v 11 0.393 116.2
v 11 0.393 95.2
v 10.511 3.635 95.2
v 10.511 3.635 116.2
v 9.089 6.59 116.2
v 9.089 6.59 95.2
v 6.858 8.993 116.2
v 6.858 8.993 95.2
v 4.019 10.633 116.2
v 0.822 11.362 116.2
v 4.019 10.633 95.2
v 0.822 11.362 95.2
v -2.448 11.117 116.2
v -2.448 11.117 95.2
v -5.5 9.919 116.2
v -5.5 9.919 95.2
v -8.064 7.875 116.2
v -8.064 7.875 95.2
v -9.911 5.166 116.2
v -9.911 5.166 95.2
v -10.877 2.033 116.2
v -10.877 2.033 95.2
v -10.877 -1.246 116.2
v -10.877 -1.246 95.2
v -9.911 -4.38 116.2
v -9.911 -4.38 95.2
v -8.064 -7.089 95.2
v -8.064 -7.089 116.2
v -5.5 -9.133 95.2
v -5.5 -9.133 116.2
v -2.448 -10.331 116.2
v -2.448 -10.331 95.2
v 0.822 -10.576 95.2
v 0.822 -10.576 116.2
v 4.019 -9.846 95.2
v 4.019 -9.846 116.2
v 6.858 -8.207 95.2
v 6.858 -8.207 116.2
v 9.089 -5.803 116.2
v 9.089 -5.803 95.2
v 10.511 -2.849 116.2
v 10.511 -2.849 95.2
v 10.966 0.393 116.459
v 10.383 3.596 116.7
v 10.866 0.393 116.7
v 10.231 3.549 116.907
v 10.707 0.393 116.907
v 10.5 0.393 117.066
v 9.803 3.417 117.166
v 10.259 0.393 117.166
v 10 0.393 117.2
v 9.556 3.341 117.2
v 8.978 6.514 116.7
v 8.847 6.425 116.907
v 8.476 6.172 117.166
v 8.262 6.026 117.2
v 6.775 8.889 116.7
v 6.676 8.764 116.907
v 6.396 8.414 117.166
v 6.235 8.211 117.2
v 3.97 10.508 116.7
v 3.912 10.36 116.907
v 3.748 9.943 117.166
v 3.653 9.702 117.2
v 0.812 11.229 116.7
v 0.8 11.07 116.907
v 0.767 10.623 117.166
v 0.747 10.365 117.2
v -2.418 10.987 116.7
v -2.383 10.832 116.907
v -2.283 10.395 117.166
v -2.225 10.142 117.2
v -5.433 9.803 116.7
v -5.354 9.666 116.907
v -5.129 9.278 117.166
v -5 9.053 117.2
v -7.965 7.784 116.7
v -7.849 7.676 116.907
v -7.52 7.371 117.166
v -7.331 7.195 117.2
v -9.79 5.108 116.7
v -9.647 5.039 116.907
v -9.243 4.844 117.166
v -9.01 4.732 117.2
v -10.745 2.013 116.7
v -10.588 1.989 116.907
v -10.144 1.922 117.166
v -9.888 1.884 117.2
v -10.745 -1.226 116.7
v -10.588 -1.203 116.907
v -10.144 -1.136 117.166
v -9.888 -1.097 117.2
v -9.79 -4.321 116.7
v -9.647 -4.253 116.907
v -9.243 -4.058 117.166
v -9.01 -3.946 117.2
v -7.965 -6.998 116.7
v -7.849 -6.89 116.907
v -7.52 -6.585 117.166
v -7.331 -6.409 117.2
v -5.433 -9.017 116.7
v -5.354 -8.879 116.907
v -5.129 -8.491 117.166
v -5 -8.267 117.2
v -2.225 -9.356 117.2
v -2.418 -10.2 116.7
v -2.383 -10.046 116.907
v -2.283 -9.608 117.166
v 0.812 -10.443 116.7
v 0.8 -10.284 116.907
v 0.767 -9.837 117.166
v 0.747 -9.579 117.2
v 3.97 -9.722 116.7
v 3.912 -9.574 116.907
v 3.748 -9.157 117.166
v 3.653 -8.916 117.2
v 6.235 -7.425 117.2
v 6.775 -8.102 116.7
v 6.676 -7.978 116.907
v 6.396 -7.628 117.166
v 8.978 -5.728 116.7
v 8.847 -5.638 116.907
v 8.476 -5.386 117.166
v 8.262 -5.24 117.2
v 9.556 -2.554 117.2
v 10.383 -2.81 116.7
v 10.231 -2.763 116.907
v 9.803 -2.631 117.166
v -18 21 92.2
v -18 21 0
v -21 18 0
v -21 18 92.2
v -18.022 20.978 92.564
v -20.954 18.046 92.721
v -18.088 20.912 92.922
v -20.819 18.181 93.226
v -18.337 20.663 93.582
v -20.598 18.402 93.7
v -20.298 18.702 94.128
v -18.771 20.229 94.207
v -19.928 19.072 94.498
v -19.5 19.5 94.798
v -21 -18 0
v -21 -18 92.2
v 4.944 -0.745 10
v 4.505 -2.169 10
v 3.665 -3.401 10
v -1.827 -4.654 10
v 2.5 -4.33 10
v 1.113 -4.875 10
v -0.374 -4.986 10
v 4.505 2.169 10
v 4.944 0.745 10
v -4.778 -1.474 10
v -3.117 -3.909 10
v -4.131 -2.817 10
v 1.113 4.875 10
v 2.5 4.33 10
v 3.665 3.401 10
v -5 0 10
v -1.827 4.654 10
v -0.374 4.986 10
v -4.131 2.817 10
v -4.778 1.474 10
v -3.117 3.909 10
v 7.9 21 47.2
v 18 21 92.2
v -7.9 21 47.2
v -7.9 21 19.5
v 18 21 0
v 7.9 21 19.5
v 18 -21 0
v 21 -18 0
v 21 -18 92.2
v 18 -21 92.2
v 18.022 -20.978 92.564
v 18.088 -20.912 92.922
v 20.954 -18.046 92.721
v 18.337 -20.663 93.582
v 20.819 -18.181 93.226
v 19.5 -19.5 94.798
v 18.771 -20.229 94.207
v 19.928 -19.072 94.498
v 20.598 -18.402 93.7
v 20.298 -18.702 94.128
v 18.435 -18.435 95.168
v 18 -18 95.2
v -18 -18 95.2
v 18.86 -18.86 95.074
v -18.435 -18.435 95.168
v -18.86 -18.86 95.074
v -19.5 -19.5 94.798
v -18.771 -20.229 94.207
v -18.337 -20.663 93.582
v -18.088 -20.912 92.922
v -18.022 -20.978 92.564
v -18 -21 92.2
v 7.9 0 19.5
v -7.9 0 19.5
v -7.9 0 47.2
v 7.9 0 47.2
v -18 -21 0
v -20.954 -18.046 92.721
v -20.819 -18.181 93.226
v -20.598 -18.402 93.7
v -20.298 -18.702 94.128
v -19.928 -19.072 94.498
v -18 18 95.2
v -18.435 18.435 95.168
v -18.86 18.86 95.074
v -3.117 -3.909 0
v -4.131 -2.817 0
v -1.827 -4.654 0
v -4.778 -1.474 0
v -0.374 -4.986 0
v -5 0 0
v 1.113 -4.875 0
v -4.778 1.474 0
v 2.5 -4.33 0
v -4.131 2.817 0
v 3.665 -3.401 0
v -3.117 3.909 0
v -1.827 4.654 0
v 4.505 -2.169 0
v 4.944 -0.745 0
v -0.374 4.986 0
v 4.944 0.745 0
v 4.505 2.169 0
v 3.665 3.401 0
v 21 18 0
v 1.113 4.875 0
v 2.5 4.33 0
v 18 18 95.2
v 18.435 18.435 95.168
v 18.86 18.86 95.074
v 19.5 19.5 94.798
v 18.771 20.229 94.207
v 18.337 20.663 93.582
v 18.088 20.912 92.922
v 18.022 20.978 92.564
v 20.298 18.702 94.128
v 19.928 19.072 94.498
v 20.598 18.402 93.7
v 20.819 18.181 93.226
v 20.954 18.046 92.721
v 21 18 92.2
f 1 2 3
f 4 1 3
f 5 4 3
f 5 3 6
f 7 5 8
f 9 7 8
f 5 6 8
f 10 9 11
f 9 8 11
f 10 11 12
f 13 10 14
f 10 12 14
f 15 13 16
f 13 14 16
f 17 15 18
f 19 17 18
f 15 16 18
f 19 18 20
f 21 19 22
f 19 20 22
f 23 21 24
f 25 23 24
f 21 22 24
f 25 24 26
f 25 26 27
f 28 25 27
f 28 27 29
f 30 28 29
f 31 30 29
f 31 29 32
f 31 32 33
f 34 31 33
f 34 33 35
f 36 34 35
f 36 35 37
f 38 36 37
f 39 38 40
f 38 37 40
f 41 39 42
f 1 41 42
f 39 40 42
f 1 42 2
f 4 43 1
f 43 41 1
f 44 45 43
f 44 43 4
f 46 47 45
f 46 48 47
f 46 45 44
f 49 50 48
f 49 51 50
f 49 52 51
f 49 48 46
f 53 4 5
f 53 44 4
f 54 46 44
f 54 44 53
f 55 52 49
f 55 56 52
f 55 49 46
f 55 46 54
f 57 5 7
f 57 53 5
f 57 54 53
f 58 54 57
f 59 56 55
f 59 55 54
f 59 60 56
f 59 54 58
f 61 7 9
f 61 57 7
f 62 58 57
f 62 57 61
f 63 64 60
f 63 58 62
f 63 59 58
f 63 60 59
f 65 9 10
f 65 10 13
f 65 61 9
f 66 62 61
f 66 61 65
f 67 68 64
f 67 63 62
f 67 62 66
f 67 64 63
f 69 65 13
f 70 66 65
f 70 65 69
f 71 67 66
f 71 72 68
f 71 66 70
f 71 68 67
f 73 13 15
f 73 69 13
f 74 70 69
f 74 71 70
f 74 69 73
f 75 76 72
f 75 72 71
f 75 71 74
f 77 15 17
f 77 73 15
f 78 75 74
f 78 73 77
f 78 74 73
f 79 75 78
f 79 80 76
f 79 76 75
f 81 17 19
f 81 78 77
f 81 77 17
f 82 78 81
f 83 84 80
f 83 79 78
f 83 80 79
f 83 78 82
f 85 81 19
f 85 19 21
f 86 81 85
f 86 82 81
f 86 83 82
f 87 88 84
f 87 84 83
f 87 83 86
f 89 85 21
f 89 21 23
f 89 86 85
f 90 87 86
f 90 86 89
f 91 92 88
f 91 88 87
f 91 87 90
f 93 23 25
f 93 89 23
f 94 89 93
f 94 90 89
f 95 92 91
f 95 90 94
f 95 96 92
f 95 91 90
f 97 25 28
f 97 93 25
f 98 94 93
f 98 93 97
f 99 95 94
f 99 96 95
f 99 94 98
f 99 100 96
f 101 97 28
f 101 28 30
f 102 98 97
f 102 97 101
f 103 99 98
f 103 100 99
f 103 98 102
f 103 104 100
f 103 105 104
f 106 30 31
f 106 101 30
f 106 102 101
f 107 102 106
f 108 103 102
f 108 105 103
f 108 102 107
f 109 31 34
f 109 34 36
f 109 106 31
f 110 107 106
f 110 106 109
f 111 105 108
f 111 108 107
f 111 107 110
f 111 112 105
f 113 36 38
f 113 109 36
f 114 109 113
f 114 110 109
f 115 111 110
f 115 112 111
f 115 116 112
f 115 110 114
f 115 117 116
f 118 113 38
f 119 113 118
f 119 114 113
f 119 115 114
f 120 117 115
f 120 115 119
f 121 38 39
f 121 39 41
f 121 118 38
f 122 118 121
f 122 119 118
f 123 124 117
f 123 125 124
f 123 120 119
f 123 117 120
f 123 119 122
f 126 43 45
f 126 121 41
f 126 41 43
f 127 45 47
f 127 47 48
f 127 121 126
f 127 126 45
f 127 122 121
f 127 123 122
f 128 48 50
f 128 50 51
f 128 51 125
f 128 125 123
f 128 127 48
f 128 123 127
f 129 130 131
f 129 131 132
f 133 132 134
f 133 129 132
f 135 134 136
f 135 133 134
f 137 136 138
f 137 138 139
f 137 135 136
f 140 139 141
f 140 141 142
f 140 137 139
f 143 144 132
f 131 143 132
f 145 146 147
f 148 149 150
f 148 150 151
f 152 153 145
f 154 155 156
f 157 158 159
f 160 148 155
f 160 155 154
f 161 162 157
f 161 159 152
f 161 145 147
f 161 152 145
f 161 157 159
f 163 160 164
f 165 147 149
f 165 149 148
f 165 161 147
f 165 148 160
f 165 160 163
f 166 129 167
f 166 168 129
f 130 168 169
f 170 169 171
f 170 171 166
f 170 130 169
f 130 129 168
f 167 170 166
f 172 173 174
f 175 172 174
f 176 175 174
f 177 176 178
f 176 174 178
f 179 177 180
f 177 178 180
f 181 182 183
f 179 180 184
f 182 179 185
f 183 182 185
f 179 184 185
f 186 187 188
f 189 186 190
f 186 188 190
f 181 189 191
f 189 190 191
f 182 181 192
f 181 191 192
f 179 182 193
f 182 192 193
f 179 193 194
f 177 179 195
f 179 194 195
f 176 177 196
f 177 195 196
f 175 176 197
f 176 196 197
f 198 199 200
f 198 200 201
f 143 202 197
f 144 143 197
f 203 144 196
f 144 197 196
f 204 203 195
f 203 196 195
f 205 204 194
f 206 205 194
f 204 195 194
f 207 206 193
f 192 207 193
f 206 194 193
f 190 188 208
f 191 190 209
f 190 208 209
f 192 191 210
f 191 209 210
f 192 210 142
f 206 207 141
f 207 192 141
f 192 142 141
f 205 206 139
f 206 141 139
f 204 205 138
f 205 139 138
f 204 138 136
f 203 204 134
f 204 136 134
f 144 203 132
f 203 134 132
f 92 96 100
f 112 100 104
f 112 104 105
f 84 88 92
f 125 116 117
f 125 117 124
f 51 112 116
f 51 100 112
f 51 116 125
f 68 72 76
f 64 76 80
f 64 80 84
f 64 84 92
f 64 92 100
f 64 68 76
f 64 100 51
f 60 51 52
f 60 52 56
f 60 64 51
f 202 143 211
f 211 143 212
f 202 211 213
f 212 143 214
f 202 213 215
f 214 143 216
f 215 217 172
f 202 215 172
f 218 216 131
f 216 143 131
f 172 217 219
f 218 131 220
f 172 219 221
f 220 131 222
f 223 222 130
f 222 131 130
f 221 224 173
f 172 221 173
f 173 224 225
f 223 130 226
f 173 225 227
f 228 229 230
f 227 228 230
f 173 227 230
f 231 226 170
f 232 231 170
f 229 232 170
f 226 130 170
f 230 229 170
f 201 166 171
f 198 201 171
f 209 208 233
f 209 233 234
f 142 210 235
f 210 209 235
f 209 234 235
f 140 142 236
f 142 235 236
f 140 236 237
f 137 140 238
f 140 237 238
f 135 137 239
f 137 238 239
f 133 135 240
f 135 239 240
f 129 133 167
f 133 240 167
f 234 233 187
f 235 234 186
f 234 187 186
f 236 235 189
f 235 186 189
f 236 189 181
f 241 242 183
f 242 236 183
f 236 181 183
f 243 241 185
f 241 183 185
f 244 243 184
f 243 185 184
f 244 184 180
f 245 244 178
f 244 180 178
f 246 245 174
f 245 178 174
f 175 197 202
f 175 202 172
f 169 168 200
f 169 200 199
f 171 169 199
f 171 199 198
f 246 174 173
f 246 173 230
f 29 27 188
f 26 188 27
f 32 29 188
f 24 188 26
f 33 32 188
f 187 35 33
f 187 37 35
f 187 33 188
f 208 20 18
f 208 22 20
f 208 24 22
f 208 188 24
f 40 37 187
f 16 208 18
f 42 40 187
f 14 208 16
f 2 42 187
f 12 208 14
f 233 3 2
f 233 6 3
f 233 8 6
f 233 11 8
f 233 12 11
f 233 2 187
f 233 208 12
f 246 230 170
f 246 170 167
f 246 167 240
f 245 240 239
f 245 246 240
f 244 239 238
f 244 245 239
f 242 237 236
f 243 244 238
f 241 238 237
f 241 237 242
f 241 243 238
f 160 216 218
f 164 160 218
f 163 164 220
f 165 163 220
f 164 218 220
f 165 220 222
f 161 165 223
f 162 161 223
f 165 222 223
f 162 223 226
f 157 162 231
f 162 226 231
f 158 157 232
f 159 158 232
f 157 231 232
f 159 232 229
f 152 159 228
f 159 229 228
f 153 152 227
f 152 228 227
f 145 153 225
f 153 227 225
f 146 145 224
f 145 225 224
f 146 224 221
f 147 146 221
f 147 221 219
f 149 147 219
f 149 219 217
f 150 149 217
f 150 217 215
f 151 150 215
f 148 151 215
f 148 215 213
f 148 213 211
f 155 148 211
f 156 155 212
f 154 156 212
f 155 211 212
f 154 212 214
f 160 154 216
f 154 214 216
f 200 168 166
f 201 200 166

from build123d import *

# Parameters (mm, degrees)
SKETCH1_W           = 42
SKETCH1_H           = 42
BOSS_EXTRUDE1_DEPTH = 95.2
SKETCH2_R           = 11
BOSS_EXTRUDE2_DEPTH = 22
SKETCH3_W           = 15.8
SKETCH3_H           = 27.7
CUT_EXTRUDE1_DEPTH  = 21
SKETCH4_R           = 5
CUT_EXTRUDE2_DEPTH  = 10
CHAMFER1_SIZE       = 3
FILLET1_R           = 3
FILLET2_R           = 1


with BuildPart() as part:
    # Sketch1 → Boss-Extrude1 (new body)
    with BuildSketch(Plane.XY):
        Rectangle(SKETCH1_W, SKETCH1_H)
    extrude(amount=BOSS_EXTRUDE1_DEPTH)

    # Sketch2 → Boss-Extrude2 (add)
    with BuildSketch(Plane.XY.offset(95.2)):
        with Locations((0, 0.393132524)):
            Circle(SKETCH2_R)
    extrude(amount=BOSS_EXTRUDE2_DEPTH)

    # Sketch3 → Cut-Extrude1 (cut)
    with BuildSketch(Plane(origin=(0, 21, 0), x_dir=(1, 0, 0), z_dir=(0, 1, 0))):
        with Locations((0, -33.35)):
            Rectangle(SKETCH3_W, SKETCH3_H)
    extrude(amount=-CUT_EXTRUDE1_DEPTH, mode=Mode.SUBTRACT)

    # Sketch4 → Cut-Extrude2 (cut)
    with BuildSketch(Plane(origin=(0, 0, 0), x_dir=(-1, 0, 0), z_dir=(0, 0, -1))):
        Circle(SKETCH4_R)
    extrude(amount=-CUT_EXTRUDE2_DEPTH, mode=Mode.SUBTRACT)

    # Chamfer1
    chamfer1_edges = [part.edges().sort_by_distance(p)[0] for p in [
        (21, -21, 47.6),
        (-21, -21, 47.6),
        (-21, 21, 47.6),
        (21, 21, 47.6),
    ]]
    chamfer(chamfer1_edges, length=CHAMFER1_SIZE)

    # Fillet1
    # the kernel refuses this fillet: 3 mm, written as the material it takes off along each edge
    with BuildSketch(Plane(origin=(-21, 25.5, 95.2), x_dir=(1, 0, 0), z_dir=(0, -1, 0)), Plane(origin=(21, -25.5, 95.2), x_dir=(-1, 0, 0), z_dir=(0, 1, 0)), Plane(origin=(25.5, 21, 95.2), x_dir=(0, -1, 0), z_dir=(-1, 0, 0))) as fillet1_piece_1:
        with BuildLine():
            CenterArc((FILLET1_R, -FILLET1_R), FILLET1_R, 90, 90)
            Line((0, -FILLET1_R), (0, 0))
            Line((0, 0), (FILLET1_R, 0))
        make_face()
    extrude(amount=51, mode=Mode.SUBTRACT)
    with BuildSketch(Plane(origin=(-25.5, -21, 95.2), x_dir=(0, 0, -1), z_dir=(1, 0, 0))) as fillet1_piece_2:
        with BuildLine():
            CenterArc((FILLET1_R, FILLET1_R), FILLET1_R, 180, 90)
            Line((0, FILLET1_R), (0, 0))
            Line((0, 0), (FILLET1_R, 0))
        make_face()
    extrude(amount=51, mode=Mode.SUBTRACT)

    # Fillet2
    fillet2_edges = [part.edges().sort_by_distance(p)[0] for p in [
        (-11, 0.393132524, 117.2),
    ]]
    fillet(fillet2_edges, radius=FILLET2_R)


solid = part.part
